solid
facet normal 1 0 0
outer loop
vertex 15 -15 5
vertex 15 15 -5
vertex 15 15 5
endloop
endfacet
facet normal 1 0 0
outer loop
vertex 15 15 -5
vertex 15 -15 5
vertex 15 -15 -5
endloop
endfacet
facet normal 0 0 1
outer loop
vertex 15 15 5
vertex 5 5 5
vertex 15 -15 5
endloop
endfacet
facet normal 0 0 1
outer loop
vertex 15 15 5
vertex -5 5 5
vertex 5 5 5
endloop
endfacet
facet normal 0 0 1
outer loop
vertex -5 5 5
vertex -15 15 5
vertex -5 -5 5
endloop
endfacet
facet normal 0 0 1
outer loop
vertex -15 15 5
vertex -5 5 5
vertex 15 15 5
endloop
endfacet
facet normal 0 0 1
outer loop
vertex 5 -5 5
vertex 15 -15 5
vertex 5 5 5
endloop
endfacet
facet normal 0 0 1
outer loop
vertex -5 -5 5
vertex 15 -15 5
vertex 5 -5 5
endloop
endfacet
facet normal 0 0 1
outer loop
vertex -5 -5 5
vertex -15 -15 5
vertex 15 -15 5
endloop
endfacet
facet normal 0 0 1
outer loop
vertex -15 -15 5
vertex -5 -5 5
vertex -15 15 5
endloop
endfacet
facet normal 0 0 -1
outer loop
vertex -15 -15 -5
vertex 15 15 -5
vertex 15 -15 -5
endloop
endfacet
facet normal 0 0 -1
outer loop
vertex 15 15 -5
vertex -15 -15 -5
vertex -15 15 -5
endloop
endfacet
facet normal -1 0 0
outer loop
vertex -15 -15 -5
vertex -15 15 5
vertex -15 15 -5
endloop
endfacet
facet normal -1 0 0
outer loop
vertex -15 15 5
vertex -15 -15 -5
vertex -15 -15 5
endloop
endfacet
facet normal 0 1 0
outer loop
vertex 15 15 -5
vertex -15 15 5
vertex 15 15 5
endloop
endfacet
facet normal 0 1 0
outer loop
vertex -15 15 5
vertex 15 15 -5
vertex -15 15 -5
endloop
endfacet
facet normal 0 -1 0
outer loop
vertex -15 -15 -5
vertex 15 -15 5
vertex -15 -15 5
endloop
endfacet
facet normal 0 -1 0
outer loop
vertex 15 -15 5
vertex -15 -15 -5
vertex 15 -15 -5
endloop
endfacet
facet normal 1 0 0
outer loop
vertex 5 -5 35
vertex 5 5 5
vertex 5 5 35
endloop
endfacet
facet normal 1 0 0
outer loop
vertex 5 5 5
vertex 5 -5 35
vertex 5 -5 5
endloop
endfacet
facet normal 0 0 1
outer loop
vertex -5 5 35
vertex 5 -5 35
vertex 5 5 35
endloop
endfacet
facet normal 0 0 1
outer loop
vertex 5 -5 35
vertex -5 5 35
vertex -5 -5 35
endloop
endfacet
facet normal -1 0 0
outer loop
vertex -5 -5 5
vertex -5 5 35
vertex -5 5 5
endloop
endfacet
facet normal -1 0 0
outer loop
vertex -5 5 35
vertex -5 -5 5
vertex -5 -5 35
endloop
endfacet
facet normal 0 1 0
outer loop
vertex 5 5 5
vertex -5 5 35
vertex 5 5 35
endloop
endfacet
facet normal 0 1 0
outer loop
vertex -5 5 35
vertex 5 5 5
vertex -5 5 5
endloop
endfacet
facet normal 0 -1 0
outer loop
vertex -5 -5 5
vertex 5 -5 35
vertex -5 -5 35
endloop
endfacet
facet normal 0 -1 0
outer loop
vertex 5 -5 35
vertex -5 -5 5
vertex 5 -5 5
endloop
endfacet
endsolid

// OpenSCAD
//-- Definiciones para acceder componentes X, Y y Z
X=0;
Y=1;
Z=2;

//-- Dimensiones de los cubos. B encima de A
A=[30,30,10];
B=[10,10,30];

//-- Calcular B encima de A
posB=[0,0,B[Z]/2+A[Z]/2];

//-- Poner cubo A
cube(A,center=true);

//-- Poner cubo B encima de A
translate(posB)
    cube(B,center=true);
